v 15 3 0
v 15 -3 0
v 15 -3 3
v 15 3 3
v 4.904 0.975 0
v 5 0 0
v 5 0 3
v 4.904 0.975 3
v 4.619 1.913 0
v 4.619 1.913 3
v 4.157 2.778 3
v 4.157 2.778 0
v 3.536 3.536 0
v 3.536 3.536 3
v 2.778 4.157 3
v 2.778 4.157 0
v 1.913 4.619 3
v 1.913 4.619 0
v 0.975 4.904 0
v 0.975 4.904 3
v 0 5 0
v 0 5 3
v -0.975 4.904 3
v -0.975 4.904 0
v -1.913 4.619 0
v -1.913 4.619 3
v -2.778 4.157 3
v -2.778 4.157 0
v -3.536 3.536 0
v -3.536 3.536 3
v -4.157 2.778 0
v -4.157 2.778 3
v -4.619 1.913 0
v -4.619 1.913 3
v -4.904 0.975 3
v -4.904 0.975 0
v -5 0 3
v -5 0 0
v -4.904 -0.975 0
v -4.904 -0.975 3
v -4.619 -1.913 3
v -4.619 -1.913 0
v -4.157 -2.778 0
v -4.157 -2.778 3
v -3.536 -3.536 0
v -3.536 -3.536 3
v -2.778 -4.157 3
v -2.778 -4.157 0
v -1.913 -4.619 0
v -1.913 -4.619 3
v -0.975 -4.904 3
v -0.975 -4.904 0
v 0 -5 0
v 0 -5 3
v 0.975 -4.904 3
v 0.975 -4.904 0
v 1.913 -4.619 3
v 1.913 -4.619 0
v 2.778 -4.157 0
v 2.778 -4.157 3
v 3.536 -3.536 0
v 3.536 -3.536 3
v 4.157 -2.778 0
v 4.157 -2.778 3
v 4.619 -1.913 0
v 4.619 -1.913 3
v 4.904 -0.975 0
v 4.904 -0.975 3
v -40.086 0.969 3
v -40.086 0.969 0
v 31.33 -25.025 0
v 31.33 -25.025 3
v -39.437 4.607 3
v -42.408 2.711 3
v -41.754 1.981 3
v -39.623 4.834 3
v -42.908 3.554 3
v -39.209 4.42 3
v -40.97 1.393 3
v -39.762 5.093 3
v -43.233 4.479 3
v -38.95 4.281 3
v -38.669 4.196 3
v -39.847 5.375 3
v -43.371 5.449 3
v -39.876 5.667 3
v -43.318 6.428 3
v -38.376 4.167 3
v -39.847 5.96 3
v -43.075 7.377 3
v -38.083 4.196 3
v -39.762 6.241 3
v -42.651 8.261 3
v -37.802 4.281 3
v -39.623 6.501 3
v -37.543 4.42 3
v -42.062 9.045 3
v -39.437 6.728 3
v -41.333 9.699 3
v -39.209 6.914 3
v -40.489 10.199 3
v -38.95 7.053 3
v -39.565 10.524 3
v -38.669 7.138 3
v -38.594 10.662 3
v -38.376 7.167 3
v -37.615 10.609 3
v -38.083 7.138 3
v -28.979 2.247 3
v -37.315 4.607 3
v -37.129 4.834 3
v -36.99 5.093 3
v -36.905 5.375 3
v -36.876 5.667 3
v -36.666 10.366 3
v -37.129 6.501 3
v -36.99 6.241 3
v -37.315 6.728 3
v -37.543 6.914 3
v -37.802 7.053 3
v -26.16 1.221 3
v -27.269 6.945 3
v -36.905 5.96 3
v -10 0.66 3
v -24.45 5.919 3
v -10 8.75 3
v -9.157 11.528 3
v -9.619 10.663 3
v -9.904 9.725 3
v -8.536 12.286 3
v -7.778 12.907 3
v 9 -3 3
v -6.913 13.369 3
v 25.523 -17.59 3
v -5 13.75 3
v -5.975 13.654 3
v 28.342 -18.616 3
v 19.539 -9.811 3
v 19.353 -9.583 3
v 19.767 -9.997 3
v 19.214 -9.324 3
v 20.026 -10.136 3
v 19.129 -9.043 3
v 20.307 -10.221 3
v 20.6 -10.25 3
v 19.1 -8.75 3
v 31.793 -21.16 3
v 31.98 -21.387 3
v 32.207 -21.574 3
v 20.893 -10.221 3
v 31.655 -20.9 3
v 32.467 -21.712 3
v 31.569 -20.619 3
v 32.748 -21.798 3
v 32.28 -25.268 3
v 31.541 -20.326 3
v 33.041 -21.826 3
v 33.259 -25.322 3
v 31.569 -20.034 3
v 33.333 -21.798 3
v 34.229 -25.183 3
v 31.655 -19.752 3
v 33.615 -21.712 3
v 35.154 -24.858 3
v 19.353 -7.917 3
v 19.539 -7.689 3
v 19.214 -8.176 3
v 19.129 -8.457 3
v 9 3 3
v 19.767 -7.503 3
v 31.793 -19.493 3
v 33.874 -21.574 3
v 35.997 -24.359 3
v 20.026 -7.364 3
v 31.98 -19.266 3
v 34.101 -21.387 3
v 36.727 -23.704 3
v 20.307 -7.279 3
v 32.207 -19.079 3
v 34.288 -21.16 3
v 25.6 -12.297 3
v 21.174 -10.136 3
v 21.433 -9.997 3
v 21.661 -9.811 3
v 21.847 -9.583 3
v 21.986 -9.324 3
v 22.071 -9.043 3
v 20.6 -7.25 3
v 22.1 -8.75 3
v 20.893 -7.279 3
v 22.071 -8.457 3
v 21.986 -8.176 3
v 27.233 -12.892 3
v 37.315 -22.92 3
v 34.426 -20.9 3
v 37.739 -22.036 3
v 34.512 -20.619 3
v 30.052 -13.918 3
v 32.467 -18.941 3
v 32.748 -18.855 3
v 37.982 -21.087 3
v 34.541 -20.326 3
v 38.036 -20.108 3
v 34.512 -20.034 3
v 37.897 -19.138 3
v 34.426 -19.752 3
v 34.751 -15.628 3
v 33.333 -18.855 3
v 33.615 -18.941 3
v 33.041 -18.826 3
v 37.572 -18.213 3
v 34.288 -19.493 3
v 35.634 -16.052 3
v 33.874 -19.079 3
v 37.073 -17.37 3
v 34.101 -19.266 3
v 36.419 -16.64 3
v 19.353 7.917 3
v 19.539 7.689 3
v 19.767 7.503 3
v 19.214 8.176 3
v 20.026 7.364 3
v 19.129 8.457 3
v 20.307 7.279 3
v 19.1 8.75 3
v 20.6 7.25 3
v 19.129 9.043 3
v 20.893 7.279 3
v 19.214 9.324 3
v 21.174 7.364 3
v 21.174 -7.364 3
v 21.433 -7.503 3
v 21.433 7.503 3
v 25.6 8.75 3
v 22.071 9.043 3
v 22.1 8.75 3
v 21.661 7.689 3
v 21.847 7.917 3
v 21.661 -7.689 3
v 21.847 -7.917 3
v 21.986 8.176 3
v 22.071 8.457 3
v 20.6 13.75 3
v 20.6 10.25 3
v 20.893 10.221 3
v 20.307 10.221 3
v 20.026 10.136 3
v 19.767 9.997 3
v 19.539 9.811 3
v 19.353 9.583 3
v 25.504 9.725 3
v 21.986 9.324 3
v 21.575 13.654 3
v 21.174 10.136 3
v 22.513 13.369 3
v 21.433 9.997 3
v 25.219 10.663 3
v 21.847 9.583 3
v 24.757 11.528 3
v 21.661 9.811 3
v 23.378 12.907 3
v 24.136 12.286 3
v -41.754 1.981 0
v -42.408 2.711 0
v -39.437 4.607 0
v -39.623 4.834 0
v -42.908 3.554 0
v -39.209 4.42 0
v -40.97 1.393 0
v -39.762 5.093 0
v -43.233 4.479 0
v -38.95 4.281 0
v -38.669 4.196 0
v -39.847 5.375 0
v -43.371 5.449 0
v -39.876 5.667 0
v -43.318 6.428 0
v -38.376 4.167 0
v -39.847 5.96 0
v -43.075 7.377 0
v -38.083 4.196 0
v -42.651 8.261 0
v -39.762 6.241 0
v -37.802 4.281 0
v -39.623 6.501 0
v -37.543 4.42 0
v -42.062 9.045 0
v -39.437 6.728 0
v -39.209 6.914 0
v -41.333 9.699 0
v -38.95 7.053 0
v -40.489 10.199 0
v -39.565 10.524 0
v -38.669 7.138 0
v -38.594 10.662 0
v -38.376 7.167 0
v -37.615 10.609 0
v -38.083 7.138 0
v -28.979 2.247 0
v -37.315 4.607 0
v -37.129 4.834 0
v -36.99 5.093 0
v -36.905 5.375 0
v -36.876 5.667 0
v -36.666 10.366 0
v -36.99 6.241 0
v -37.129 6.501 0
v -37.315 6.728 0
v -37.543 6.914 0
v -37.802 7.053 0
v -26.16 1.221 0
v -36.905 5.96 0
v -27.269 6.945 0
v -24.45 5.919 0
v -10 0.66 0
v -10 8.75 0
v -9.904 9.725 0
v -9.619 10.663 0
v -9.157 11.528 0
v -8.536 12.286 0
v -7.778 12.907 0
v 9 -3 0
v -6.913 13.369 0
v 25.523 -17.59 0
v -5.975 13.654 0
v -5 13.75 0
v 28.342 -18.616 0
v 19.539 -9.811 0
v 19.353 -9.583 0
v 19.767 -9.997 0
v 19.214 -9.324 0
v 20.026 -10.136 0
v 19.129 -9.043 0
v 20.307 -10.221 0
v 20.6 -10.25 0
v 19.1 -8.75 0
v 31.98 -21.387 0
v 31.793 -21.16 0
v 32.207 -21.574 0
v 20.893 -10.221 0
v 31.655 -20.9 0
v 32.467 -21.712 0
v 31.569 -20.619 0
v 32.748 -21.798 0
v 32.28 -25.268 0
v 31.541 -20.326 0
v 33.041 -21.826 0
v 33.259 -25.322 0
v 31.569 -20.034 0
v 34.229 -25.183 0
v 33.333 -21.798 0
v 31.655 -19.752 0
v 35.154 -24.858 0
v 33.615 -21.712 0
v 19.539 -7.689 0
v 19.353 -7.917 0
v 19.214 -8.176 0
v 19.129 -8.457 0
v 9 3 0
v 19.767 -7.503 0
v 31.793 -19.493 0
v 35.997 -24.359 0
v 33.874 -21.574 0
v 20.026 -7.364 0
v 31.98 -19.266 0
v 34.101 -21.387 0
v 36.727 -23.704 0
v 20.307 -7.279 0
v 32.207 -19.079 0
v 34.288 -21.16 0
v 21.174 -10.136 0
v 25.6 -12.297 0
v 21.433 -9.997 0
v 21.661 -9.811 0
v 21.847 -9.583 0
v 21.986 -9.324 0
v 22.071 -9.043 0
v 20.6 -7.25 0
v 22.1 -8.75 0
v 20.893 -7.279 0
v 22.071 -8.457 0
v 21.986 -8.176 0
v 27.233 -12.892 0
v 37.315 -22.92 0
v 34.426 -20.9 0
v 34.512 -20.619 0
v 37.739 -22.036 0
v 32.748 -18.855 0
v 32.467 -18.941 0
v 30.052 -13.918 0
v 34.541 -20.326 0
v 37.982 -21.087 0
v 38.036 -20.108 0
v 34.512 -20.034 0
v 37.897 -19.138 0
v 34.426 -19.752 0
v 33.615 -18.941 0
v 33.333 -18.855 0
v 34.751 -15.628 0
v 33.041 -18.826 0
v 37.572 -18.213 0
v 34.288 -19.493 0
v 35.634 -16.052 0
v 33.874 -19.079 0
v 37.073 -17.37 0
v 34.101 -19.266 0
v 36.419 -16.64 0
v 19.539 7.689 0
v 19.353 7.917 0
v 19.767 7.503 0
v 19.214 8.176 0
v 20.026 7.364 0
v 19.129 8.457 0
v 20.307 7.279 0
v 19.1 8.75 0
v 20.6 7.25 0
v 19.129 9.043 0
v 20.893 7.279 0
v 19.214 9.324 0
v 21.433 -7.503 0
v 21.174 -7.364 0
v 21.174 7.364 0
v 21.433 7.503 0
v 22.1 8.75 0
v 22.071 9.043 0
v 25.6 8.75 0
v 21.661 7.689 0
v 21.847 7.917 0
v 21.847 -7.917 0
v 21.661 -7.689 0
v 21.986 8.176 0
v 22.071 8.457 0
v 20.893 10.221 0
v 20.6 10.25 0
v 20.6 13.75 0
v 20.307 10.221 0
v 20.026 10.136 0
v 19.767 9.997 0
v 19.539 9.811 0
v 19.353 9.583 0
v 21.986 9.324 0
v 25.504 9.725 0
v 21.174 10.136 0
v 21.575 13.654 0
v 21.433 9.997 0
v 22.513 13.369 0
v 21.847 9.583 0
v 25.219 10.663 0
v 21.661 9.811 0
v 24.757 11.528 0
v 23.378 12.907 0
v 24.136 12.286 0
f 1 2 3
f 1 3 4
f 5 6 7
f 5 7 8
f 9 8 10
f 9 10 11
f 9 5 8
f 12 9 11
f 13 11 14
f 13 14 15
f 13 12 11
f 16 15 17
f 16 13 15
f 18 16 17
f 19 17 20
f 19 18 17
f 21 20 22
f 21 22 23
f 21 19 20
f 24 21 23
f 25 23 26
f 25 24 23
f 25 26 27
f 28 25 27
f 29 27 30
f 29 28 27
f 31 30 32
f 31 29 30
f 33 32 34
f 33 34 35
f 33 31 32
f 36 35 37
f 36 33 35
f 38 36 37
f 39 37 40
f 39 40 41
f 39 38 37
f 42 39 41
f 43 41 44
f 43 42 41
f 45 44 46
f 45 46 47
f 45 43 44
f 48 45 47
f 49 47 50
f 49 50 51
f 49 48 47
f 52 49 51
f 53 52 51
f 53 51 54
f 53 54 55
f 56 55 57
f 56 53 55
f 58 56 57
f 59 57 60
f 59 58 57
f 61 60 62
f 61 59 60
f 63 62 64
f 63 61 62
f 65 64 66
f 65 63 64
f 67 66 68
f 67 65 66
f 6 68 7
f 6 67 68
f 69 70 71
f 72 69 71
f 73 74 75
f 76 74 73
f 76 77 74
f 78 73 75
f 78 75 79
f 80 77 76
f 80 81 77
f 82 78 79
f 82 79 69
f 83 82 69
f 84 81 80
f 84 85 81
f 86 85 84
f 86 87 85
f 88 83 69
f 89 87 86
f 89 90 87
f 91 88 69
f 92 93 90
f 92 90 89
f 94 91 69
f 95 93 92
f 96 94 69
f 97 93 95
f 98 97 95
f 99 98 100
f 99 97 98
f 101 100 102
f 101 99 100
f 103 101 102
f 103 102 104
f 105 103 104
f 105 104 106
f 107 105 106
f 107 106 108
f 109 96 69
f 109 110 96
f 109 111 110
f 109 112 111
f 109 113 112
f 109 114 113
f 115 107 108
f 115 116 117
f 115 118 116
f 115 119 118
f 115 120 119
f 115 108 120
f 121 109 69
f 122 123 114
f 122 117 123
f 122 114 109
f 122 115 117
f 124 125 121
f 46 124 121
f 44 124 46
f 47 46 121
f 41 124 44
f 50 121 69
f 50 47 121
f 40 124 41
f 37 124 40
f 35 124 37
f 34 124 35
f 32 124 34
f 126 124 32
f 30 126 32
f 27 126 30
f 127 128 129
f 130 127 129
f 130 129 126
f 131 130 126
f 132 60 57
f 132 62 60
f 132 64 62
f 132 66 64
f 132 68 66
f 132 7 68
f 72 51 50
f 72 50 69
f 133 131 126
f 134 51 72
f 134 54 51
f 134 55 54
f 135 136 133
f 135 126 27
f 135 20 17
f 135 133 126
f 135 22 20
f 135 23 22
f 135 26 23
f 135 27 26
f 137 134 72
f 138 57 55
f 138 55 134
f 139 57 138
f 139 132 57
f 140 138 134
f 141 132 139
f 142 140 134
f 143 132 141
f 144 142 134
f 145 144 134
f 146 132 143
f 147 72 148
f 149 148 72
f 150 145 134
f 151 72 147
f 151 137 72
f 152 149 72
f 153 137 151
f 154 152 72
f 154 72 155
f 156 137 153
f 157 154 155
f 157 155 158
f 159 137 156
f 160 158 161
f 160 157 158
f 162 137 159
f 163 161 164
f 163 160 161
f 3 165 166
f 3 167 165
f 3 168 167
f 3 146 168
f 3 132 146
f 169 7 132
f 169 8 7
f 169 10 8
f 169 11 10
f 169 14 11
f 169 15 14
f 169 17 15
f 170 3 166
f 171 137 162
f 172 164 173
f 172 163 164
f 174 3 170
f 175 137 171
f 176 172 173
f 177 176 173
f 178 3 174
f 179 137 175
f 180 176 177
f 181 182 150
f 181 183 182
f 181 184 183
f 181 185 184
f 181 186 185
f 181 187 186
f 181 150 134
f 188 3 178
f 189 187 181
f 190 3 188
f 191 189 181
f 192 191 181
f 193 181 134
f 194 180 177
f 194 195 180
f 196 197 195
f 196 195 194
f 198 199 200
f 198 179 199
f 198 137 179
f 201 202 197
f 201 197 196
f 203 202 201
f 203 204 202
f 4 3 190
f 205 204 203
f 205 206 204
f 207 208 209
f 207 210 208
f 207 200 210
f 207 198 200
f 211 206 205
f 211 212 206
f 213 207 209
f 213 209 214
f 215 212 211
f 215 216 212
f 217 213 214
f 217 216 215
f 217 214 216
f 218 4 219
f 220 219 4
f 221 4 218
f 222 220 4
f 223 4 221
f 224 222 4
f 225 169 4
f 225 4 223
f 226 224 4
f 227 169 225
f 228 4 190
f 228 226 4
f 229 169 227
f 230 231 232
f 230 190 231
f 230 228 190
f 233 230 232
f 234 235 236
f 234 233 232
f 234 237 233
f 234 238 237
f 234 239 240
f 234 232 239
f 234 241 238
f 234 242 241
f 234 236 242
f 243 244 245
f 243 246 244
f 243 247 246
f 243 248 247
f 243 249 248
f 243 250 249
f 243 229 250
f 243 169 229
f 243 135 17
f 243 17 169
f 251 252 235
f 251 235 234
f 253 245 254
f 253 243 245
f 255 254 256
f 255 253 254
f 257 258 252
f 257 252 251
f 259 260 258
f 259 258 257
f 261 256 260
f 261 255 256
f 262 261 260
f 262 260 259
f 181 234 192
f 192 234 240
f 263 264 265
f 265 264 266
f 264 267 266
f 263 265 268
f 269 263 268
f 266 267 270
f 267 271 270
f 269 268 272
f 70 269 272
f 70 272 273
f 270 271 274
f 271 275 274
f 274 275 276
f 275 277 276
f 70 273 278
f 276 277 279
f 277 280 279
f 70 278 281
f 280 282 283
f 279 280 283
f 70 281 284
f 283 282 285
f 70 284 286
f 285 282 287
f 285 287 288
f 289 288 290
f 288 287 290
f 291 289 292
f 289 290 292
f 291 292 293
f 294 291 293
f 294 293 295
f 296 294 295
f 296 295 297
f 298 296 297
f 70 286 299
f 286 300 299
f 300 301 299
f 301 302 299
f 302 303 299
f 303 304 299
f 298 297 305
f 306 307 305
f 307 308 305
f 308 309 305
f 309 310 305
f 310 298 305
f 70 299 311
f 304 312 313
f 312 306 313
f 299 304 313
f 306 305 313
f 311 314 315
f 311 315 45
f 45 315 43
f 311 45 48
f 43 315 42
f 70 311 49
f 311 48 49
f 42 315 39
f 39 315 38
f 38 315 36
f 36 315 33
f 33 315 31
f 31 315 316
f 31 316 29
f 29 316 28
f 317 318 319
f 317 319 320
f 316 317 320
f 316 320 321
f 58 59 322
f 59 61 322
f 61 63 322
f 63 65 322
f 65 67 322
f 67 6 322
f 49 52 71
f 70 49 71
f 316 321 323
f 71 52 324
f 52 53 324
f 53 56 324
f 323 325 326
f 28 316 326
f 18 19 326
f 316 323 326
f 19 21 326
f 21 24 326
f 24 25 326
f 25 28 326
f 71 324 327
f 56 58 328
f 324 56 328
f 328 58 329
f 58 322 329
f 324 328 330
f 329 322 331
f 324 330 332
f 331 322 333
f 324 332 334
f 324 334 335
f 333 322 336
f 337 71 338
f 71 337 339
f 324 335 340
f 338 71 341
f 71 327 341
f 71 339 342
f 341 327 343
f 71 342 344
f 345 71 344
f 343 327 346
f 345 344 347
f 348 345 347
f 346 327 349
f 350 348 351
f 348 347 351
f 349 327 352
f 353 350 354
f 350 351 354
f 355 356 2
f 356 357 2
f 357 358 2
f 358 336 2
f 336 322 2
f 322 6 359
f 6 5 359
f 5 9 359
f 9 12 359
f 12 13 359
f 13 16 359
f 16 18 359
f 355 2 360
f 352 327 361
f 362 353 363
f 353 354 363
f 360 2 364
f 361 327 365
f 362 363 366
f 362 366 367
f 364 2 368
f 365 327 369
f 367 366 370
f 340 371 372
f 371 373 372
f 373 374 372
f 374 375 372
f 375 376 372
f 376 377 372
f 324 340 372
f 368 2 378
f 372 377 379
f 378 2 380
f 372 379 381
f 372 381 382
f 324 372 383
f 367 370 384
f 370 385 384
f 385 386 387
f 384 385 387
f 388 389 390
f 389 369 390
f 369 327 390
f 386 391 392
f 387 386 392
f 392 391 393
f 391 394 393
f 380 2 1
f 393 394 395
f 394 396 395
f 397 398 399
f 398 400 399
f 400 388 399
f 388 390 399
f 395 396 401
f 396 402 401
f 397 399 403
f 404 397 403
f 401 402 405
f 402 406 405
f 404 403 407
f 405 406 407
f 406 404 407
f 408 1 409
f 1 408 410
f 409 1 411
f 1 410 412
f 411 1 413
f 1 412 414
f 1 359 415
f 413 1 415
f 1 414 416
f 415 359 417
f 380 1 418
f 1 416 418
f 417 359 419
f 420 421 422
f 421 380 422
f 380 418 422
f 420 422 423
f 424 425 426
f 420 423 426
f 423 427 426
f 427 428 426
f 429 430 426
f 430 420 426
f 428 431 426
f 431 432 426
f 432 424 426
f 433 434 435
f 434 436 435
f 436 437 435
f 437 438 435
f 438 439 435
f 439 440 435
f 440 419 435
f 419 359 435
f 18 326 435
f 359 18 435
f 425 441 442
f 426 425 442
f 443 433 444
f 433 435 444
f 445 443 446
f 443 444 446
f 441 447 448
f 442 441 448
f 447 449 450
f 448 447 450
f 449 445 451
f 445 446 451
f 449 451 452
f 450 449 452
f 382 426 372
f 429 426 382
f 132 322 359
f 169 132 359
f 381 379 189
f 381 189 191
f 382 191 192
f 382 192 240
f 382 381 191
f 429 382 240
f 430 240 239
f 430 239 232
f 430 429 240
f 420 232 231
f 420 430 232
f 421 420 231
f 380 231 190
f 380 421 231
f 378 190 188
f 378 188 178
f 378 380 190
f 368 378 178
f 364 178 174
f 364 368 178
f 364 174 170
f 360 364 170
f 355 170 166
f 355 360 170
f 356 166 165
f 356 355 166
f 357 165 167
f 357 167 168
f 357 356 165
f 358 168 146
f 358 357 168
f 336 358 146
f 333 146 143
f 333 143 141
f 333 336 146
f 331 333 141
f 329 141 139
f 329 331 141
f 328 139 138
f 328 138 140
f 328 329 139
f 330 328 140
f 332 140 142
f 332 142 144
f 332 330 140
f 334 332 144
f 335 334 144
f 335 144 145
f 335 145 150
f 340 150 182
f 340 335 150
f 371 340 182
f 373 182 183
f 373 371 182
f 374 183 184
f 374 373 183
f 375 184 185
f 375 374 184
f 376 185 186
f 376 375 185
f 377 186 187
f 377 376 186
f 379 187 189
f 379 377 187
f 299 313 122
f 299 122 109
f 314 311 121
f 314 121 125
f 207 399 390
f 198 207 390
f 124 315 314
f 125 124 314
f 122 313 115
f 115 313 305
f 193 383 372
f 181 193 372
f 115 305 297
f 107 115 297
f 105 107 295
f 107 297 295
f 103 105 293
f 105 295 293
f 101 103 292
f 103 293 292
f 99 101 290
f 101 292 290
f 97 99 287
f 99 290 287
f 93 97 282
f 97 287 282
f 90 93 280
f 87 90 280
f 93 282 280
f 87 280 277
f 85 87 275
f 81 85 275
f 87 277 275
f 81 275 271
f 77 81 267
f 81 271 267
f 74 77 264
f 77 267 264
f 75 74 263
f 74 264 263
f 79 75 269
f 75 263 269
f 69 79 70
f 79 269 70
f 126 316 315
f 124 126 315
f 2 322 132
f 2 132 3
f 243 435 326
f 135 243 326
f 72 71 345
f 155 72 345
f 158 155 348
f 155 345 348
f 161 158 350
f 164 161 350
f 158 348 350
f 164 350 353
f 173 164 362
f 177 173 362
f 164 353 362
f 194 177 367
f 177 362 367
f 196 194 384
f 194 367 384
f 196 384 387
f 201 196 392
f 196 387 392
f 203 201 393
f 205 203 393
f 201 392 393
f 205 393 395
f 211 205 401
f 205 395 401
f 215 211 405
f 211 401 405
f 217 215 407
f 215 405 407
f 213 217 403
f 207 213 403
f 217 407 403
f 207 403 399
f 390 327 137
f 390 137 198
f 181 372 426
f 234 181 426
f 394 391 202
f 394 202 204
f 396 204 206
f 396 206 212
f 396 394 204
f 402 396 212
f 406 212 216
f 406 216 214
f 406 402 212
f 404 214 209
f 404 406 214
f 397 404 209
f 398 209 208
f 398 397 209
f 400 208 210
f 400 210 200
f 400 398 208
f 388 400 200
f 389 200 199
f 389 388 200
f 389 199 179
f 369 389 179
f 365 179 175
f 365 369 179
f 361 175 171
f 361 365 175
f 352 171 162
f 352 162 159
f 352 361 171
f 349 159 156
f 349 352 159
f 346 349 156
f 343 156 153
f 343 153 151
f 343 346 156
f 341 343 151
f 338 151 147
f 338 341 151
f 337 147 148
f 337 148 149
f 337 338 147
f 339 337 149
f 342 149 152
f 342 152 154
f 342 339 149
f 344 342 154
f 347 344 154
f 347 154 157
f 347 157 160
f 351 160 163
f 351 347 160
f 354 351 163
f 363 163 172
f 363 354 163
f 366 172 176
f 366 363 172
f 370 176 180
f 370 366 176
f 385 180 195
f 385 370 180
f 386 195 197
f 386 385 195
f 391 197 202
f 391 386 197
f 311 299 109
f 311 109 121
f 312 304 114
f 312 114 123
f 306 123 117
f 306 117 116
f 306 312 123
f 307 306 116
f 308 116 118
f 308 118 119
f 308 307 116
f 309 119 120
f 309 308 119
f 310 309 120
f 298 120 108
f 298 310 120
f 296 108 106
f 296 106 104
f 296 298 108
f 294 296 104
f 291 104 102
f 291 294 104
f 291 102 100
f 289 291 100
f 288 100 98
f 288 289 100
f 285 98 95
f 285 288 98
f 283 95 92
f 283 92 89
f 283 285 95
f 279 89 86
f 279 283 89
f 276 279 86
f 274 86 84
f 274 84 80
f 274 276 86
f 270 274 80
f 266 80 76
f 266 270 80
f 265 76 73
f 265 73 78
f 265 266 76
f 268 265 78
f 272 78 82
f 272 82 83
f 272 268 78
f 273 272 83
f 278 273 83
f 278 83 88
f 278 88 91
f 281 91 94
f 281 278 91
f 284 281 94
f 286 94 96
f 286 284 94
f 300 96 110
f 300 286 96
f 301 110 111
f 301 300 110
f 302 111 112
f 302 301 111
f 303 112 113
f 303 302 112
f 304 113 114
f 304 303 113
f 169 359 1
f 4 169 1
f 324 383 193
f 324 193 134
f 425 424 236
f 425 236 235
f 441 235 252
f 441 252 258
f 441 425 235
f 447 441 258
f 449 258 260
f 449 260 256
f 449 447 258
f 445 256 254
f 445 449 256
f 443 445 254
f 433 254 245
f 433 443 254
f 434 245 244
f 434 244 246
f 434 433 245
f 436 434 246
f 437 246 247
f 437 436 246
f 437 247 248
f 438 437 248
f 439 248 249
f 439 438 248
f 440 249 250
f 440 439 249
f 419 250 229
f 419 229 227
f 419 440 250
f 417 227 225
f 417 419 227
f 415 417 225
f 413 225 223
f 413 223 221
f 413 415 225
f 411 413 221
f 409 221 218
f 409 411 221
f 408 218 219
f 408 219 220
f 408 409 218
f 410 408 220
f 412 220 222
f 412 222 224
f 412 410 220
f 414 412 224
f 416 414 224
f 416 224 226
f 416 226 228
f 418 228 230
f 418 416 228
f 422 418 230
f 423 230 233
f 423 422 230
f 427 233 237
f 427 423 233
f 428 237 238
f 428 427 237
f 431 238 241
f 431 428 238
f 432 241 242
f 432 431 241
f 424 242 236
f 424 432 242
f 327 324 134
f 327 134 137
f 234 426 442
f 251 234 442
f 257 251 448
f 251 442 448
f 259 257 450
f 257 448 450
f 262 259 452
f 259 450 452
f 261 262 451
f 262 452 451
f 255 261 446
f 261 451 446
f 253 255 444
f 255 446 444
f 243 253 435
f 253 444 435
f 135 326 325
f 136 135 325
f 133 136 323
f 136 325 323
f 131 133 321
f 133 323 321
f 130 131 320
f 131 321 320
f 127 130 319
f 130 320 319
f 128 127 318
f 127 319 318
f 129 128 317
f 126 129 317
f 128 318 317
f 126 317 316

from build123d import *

# Parameters (mm, degrees)
SKETCH1_R           = 5
SKETCH1_R_2         = 1.5
SKETCH1_W           = 6
SKETCH1_H           = 6
BOSS_EXTRUDE1_DEPTH = 3
CUT_EXTRUDE1_DEPTH  = 51.318077676


with BuildPart() as part:
    # Sketch1 → Boss-Extrude1 (new body)
    with BuildSketch(Plane.XY):
        with BuildLine():
            Line((25.6, -12.03135802), (25.6, 8.75))
            ThreePointArc((25.6, 8.75), (24.135533906, 12.285533906), (20.6, 13.75))
            Line((20.6, 13.75), (-5, 13.75))
            ThreePointArc((-5, 13.75), (-8.535533906, 12.285533906), (-10, 8.75))
            Line((-10, 8.75), (-10, 0.66000458))
            Line((-10, 0.66000458), (-36.665975991, 10.365626108))
            ThreePointArc((-36.665975991, 10.365626108), (-43.074539812, 7.377263721), (-40.086177424, 0.9686999))
            Line((-40.086177424, 0.9686999), (31.330461755, -25.024830992))
            ThreePointArc((31.330461755, -25.024830992), (37.739025576, -22.036468605), (34.750663189, -15.627904785))
            Line((34.750663189, -15.627904785), (25.6, -12.29733576))
            Line((25.6, -12.29733576), (25.6, -12.03135802))
        make_face()
        Circle(SKETCH1_R, mode=Mode.SUBTRACT)
        with Locations((20.6, 8.75)):
            Circle(SKETCH1_R_2, mode=Mode.SUBTRACT)
        with Locations((20.6, -8.75)):
            Circle(SKETCH1_R_2, mode=Mode.SUBTRACT)
        with Locations((-38.376076708, 5.667163004)):
            Circle(SKETCH1_R_2, mode=Mode.SUBTRACT)
        with Locations((33.040562472, -20.326367889)):
            Circle(SKETCH1_R_2, mode=Mode.SUBTRACT)
        with Locations((12, 0)):
            Rectangle(SKETCH1_W, SKETCH1_H, mode=Mode.SUBTRACT)
    extrude(amount=BOSS_EXTRUDE1_DEPTH)

    # Sketch2 → Cut-Extrude1 (cut, through all)
    with BuildSketch(Plane(origin=(0, 0, 0), x_dir=(-1, 0, 0), z_dir=(0, 0, -1))):
        Polygon((24.449971921, 5.919364245), (27.269049783, 6.945424675), (28.9791505, 2.246961571), (26.160072638, 1.220901141), align=None)
        Polygon((-30.052200085, -13.917804068), (-27.233122222, -12.891743638), (-25.523021506, -17.590206742), (-28.342099368, -18.616267172), align=None)
    extrude(amount=-CUT_EXTRUDE1_DEPTH, mode=Mode.SUBTRACT)


solid = part.part
